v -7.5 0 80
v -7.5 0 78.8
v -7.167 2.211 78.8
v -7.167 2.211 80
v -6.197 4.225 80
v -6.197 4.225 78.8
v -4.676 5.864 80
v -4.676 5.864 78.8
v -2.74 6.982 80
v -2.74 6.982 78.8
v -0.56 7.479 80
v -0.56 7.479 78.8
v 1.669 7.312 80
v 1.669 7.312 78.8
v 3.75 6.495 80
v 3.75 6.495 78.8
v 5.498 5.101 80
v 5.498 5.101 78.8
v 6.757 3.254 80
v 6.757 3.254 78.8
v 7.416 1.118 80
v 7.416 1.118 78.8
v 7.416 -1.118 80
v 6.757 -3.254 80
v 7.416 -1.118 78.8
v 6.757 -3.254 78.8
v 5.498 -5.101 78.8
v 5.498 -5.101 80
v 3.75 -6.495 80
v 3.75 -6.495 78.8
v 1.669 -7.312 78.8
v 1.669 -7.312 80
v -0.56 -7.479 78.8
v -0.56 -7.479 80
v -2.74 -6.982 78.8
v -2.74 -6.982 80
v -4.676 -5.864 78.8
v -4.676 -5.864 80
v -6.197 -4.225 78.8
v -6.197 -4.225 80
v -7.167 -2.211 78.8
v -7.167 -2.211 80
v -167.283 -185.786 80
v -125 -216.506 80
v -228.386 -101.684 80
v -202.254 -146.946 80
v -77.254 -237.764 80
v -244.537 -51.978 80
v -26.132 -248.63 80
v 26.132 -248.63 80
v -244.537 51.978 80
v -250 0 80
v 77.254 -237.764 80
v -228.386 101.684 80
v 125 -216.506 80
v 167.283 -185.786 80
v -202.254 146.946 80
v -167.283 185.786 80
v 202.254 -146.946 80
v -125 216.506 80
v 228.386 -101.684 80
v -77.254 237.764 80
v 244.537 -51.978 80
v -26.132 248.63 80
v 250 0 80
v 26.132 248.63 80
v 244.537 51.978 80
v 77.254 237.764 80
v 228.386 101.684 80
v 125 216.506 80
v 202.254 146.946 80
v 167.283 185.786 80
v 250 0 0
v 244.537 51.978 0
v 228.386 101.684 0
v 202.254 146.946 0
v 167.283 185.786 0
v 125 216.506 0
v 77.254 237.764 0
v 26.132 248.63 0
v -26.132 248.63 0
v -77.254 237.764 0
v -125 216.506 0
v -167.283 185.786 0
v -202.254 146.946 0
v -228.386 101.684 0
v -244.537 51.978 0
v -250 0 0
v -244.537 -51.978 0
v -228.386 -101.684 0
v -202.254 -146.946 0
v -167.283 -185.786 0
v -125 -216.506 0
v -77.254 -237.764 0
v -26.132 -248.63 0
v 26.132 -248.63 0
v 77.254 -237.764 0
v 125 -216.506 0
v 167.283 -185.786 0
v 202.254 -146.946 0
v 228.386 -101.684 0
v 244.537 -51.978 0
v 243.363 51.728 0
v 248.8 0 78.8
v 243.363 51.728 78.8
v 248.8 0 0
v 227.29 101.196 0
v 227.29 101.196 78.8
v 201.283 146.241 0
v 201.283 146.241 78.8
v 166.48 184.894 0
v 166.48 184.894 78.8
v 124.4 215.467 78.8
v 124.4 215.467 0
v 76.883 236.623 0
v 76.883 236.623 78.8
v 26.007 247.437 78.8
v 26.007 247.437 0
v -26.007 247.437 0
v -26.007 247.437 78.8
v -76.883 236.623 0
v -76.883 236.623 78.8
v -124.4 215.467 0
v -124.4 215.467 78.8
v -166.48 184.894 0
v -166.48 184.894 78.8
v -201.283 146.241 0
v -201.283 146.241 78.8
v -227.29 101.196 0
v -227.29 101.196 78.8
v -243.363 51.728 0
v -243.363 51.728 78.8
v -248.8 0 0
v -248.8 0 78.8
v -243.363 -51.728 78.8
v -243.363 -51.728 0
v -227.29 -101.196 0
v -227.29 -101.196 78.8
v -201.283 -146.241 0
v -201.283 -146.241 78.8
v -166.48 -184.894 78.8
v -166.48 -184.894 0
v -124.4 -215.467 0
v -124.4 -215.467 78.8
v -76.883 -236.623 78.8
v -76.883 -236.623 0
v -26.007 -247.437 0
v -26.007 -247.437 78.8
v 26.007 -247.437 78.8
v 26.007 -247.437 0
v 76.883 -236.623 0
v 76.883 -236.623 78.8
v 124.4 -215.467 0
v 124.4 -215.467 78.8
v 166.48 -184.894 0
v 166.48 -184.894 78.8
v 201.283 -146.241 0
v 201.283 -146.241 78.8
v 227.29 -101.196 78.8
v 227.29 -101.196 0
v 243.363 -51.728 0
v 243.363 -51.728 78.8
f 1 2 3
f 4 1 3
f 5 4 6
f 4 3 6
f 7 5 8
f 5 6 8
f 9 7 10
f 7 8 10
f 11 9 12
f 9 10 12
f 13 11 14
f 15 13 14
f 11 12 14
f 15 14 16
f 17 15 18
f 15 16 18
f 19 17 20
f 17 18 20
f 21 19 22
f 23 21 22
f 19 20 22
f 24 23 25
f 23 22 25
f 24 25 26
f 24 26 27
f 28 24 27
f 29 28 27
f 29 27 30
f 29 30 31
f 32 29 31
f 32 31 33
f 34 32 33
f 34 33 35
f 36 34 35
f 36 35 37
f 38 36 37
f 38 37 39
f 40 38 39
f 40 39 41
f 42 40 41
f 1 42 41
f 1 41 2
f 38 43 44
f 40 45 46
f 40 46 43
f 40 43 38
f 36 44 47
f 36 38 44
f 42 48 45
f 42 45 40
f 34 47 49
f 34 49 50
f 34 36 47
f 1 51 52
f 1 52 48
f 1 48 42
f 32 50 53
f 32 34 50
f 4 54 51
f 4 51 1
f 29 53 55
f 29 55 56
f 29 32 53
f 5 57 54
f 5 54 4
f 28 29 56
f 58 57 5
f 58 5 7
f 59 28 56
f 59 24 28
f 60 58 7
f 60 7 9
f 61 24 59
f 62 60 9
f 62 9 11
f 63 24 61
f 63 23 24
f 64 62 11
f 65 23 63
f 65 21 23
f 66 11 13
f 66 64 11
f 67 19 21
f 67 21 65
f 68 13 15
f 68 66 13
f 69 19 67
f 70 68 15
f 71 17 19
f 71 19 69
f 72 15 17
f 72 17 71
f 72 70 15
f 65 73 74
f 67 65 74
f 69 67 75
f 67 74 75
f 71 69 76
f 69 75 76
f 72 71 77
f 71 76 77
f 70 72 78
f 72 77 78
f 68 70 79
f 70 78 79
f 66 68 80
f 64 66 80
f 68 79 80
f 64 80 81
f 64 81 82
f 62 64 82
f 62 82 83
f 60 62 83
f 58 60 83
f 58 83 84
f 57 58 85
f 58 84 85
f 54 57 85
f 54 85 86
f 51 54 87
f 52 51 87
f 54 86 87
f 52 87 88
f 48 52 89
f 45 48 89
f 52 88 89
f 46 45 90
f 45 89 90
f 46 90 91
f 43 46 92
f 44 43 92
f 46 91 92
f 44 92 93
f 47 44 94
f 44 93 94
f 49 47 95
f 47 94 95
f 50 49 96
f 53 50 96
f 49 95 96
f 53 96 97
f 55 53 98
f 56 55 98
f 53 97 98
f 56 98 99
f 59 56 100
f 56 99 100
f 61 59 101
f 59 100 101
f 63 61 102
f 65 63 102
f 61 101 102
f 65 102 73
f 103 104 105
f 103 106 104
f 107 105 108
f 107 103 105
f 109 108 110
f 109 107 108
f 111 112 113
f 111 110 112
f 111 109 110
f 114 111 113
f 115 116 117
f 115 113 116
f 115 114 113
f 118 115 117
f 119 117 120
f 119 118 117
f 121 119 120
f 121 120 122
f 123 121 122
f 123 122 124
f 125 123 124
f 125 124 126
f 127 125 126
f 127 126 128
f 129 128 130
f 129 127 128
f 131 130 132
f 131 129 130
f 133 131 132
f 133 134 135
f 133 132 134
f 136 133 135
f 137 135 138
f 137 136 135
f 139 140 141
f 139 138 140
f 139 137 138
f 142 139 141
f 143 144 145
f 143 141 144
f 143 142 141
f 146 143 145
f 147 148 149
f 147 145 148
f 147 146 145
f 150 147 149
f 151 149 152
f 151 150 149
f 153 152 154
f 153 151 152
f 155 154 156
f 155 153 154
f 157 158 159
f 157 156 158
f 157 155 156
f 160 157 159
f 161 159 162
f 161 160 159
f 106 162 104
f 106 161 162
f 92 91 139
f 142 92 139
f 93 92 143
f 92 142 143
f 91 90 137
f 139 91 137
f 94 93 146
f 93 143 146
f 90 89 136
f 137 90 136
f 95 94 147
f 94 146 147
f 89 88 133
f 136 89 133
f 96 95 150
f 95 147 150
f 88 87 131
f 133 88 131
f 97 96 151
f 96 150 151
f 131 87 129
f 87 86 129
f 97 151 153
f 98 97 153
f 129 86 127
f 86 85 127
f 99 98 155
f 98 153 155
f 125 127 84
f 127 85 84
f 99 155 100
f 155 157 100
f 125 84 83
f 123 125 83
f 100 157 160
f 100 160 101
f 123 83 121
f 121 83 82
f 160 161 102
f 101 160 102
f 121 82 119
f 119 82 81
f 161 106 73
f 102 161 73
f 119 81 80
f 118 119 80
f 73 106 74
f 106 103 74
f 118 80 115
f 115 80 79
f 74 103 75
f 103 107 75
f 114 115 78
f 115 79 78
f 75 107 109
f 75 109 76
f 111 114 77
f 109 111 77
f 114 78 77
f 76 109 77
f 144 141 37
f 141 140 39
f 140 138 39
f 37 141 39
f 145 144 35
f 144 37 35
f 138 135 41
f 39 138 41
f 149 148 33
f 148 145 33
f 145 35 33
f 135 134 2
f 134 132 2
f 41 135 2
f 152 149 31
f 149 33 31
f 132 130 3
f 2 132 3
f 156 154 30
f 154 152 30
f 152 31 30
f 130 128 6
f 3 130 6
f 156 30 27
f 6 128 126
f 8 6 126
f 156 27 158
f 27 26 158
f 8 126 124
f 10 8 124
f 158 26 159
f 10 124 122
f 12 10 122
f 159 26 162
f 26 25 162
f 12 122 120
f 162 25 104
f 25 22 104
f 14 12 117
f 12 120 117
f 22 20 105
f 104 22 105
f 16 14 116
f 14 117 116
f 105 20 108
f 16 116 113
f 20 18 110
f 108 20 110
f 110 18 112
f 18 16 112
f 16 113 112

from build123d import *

# Parameters (mm, degrees)
SKETCH1_R           = 250
BOSS_EXTRUDE1_DEPTH = 80
SHELL1_T            = -1.2
SKETCH2_R           = 7.5
CUT_EXTRUDE1_DEPTH  = 10


with BuildPart() as part:
    # Sketch1 → Boss-Extrude1 (new body)
    with BuildSketch(Plane.XY):
        Circle(SKETCH1_R)
    extrude(amount=BOSS_EXTRUDE1_DEPTH)

    # Shell1
    shell1_openings = [part.faces().sort_by_distance(p)[0] for p in [
        (0, 0, 0),
    ]]
    offset(amount=SHELL1_T, openings=shell1_openings, kind=Kind.INTERSECTION)

    # Sketch2 → Cut-Extrude1 (cut)
    with BuildSketch(Plane(origin=(0, 0, 78.8), x_dir=(-1, 0, 0), z_dir=(0, 0, -1))):
        Circle(SKETCH2_R)
    extrude(amount=-CUT_EXTRUDE1_DEPTH, mode=Mode.SUBTRACT)


solid = part.part
